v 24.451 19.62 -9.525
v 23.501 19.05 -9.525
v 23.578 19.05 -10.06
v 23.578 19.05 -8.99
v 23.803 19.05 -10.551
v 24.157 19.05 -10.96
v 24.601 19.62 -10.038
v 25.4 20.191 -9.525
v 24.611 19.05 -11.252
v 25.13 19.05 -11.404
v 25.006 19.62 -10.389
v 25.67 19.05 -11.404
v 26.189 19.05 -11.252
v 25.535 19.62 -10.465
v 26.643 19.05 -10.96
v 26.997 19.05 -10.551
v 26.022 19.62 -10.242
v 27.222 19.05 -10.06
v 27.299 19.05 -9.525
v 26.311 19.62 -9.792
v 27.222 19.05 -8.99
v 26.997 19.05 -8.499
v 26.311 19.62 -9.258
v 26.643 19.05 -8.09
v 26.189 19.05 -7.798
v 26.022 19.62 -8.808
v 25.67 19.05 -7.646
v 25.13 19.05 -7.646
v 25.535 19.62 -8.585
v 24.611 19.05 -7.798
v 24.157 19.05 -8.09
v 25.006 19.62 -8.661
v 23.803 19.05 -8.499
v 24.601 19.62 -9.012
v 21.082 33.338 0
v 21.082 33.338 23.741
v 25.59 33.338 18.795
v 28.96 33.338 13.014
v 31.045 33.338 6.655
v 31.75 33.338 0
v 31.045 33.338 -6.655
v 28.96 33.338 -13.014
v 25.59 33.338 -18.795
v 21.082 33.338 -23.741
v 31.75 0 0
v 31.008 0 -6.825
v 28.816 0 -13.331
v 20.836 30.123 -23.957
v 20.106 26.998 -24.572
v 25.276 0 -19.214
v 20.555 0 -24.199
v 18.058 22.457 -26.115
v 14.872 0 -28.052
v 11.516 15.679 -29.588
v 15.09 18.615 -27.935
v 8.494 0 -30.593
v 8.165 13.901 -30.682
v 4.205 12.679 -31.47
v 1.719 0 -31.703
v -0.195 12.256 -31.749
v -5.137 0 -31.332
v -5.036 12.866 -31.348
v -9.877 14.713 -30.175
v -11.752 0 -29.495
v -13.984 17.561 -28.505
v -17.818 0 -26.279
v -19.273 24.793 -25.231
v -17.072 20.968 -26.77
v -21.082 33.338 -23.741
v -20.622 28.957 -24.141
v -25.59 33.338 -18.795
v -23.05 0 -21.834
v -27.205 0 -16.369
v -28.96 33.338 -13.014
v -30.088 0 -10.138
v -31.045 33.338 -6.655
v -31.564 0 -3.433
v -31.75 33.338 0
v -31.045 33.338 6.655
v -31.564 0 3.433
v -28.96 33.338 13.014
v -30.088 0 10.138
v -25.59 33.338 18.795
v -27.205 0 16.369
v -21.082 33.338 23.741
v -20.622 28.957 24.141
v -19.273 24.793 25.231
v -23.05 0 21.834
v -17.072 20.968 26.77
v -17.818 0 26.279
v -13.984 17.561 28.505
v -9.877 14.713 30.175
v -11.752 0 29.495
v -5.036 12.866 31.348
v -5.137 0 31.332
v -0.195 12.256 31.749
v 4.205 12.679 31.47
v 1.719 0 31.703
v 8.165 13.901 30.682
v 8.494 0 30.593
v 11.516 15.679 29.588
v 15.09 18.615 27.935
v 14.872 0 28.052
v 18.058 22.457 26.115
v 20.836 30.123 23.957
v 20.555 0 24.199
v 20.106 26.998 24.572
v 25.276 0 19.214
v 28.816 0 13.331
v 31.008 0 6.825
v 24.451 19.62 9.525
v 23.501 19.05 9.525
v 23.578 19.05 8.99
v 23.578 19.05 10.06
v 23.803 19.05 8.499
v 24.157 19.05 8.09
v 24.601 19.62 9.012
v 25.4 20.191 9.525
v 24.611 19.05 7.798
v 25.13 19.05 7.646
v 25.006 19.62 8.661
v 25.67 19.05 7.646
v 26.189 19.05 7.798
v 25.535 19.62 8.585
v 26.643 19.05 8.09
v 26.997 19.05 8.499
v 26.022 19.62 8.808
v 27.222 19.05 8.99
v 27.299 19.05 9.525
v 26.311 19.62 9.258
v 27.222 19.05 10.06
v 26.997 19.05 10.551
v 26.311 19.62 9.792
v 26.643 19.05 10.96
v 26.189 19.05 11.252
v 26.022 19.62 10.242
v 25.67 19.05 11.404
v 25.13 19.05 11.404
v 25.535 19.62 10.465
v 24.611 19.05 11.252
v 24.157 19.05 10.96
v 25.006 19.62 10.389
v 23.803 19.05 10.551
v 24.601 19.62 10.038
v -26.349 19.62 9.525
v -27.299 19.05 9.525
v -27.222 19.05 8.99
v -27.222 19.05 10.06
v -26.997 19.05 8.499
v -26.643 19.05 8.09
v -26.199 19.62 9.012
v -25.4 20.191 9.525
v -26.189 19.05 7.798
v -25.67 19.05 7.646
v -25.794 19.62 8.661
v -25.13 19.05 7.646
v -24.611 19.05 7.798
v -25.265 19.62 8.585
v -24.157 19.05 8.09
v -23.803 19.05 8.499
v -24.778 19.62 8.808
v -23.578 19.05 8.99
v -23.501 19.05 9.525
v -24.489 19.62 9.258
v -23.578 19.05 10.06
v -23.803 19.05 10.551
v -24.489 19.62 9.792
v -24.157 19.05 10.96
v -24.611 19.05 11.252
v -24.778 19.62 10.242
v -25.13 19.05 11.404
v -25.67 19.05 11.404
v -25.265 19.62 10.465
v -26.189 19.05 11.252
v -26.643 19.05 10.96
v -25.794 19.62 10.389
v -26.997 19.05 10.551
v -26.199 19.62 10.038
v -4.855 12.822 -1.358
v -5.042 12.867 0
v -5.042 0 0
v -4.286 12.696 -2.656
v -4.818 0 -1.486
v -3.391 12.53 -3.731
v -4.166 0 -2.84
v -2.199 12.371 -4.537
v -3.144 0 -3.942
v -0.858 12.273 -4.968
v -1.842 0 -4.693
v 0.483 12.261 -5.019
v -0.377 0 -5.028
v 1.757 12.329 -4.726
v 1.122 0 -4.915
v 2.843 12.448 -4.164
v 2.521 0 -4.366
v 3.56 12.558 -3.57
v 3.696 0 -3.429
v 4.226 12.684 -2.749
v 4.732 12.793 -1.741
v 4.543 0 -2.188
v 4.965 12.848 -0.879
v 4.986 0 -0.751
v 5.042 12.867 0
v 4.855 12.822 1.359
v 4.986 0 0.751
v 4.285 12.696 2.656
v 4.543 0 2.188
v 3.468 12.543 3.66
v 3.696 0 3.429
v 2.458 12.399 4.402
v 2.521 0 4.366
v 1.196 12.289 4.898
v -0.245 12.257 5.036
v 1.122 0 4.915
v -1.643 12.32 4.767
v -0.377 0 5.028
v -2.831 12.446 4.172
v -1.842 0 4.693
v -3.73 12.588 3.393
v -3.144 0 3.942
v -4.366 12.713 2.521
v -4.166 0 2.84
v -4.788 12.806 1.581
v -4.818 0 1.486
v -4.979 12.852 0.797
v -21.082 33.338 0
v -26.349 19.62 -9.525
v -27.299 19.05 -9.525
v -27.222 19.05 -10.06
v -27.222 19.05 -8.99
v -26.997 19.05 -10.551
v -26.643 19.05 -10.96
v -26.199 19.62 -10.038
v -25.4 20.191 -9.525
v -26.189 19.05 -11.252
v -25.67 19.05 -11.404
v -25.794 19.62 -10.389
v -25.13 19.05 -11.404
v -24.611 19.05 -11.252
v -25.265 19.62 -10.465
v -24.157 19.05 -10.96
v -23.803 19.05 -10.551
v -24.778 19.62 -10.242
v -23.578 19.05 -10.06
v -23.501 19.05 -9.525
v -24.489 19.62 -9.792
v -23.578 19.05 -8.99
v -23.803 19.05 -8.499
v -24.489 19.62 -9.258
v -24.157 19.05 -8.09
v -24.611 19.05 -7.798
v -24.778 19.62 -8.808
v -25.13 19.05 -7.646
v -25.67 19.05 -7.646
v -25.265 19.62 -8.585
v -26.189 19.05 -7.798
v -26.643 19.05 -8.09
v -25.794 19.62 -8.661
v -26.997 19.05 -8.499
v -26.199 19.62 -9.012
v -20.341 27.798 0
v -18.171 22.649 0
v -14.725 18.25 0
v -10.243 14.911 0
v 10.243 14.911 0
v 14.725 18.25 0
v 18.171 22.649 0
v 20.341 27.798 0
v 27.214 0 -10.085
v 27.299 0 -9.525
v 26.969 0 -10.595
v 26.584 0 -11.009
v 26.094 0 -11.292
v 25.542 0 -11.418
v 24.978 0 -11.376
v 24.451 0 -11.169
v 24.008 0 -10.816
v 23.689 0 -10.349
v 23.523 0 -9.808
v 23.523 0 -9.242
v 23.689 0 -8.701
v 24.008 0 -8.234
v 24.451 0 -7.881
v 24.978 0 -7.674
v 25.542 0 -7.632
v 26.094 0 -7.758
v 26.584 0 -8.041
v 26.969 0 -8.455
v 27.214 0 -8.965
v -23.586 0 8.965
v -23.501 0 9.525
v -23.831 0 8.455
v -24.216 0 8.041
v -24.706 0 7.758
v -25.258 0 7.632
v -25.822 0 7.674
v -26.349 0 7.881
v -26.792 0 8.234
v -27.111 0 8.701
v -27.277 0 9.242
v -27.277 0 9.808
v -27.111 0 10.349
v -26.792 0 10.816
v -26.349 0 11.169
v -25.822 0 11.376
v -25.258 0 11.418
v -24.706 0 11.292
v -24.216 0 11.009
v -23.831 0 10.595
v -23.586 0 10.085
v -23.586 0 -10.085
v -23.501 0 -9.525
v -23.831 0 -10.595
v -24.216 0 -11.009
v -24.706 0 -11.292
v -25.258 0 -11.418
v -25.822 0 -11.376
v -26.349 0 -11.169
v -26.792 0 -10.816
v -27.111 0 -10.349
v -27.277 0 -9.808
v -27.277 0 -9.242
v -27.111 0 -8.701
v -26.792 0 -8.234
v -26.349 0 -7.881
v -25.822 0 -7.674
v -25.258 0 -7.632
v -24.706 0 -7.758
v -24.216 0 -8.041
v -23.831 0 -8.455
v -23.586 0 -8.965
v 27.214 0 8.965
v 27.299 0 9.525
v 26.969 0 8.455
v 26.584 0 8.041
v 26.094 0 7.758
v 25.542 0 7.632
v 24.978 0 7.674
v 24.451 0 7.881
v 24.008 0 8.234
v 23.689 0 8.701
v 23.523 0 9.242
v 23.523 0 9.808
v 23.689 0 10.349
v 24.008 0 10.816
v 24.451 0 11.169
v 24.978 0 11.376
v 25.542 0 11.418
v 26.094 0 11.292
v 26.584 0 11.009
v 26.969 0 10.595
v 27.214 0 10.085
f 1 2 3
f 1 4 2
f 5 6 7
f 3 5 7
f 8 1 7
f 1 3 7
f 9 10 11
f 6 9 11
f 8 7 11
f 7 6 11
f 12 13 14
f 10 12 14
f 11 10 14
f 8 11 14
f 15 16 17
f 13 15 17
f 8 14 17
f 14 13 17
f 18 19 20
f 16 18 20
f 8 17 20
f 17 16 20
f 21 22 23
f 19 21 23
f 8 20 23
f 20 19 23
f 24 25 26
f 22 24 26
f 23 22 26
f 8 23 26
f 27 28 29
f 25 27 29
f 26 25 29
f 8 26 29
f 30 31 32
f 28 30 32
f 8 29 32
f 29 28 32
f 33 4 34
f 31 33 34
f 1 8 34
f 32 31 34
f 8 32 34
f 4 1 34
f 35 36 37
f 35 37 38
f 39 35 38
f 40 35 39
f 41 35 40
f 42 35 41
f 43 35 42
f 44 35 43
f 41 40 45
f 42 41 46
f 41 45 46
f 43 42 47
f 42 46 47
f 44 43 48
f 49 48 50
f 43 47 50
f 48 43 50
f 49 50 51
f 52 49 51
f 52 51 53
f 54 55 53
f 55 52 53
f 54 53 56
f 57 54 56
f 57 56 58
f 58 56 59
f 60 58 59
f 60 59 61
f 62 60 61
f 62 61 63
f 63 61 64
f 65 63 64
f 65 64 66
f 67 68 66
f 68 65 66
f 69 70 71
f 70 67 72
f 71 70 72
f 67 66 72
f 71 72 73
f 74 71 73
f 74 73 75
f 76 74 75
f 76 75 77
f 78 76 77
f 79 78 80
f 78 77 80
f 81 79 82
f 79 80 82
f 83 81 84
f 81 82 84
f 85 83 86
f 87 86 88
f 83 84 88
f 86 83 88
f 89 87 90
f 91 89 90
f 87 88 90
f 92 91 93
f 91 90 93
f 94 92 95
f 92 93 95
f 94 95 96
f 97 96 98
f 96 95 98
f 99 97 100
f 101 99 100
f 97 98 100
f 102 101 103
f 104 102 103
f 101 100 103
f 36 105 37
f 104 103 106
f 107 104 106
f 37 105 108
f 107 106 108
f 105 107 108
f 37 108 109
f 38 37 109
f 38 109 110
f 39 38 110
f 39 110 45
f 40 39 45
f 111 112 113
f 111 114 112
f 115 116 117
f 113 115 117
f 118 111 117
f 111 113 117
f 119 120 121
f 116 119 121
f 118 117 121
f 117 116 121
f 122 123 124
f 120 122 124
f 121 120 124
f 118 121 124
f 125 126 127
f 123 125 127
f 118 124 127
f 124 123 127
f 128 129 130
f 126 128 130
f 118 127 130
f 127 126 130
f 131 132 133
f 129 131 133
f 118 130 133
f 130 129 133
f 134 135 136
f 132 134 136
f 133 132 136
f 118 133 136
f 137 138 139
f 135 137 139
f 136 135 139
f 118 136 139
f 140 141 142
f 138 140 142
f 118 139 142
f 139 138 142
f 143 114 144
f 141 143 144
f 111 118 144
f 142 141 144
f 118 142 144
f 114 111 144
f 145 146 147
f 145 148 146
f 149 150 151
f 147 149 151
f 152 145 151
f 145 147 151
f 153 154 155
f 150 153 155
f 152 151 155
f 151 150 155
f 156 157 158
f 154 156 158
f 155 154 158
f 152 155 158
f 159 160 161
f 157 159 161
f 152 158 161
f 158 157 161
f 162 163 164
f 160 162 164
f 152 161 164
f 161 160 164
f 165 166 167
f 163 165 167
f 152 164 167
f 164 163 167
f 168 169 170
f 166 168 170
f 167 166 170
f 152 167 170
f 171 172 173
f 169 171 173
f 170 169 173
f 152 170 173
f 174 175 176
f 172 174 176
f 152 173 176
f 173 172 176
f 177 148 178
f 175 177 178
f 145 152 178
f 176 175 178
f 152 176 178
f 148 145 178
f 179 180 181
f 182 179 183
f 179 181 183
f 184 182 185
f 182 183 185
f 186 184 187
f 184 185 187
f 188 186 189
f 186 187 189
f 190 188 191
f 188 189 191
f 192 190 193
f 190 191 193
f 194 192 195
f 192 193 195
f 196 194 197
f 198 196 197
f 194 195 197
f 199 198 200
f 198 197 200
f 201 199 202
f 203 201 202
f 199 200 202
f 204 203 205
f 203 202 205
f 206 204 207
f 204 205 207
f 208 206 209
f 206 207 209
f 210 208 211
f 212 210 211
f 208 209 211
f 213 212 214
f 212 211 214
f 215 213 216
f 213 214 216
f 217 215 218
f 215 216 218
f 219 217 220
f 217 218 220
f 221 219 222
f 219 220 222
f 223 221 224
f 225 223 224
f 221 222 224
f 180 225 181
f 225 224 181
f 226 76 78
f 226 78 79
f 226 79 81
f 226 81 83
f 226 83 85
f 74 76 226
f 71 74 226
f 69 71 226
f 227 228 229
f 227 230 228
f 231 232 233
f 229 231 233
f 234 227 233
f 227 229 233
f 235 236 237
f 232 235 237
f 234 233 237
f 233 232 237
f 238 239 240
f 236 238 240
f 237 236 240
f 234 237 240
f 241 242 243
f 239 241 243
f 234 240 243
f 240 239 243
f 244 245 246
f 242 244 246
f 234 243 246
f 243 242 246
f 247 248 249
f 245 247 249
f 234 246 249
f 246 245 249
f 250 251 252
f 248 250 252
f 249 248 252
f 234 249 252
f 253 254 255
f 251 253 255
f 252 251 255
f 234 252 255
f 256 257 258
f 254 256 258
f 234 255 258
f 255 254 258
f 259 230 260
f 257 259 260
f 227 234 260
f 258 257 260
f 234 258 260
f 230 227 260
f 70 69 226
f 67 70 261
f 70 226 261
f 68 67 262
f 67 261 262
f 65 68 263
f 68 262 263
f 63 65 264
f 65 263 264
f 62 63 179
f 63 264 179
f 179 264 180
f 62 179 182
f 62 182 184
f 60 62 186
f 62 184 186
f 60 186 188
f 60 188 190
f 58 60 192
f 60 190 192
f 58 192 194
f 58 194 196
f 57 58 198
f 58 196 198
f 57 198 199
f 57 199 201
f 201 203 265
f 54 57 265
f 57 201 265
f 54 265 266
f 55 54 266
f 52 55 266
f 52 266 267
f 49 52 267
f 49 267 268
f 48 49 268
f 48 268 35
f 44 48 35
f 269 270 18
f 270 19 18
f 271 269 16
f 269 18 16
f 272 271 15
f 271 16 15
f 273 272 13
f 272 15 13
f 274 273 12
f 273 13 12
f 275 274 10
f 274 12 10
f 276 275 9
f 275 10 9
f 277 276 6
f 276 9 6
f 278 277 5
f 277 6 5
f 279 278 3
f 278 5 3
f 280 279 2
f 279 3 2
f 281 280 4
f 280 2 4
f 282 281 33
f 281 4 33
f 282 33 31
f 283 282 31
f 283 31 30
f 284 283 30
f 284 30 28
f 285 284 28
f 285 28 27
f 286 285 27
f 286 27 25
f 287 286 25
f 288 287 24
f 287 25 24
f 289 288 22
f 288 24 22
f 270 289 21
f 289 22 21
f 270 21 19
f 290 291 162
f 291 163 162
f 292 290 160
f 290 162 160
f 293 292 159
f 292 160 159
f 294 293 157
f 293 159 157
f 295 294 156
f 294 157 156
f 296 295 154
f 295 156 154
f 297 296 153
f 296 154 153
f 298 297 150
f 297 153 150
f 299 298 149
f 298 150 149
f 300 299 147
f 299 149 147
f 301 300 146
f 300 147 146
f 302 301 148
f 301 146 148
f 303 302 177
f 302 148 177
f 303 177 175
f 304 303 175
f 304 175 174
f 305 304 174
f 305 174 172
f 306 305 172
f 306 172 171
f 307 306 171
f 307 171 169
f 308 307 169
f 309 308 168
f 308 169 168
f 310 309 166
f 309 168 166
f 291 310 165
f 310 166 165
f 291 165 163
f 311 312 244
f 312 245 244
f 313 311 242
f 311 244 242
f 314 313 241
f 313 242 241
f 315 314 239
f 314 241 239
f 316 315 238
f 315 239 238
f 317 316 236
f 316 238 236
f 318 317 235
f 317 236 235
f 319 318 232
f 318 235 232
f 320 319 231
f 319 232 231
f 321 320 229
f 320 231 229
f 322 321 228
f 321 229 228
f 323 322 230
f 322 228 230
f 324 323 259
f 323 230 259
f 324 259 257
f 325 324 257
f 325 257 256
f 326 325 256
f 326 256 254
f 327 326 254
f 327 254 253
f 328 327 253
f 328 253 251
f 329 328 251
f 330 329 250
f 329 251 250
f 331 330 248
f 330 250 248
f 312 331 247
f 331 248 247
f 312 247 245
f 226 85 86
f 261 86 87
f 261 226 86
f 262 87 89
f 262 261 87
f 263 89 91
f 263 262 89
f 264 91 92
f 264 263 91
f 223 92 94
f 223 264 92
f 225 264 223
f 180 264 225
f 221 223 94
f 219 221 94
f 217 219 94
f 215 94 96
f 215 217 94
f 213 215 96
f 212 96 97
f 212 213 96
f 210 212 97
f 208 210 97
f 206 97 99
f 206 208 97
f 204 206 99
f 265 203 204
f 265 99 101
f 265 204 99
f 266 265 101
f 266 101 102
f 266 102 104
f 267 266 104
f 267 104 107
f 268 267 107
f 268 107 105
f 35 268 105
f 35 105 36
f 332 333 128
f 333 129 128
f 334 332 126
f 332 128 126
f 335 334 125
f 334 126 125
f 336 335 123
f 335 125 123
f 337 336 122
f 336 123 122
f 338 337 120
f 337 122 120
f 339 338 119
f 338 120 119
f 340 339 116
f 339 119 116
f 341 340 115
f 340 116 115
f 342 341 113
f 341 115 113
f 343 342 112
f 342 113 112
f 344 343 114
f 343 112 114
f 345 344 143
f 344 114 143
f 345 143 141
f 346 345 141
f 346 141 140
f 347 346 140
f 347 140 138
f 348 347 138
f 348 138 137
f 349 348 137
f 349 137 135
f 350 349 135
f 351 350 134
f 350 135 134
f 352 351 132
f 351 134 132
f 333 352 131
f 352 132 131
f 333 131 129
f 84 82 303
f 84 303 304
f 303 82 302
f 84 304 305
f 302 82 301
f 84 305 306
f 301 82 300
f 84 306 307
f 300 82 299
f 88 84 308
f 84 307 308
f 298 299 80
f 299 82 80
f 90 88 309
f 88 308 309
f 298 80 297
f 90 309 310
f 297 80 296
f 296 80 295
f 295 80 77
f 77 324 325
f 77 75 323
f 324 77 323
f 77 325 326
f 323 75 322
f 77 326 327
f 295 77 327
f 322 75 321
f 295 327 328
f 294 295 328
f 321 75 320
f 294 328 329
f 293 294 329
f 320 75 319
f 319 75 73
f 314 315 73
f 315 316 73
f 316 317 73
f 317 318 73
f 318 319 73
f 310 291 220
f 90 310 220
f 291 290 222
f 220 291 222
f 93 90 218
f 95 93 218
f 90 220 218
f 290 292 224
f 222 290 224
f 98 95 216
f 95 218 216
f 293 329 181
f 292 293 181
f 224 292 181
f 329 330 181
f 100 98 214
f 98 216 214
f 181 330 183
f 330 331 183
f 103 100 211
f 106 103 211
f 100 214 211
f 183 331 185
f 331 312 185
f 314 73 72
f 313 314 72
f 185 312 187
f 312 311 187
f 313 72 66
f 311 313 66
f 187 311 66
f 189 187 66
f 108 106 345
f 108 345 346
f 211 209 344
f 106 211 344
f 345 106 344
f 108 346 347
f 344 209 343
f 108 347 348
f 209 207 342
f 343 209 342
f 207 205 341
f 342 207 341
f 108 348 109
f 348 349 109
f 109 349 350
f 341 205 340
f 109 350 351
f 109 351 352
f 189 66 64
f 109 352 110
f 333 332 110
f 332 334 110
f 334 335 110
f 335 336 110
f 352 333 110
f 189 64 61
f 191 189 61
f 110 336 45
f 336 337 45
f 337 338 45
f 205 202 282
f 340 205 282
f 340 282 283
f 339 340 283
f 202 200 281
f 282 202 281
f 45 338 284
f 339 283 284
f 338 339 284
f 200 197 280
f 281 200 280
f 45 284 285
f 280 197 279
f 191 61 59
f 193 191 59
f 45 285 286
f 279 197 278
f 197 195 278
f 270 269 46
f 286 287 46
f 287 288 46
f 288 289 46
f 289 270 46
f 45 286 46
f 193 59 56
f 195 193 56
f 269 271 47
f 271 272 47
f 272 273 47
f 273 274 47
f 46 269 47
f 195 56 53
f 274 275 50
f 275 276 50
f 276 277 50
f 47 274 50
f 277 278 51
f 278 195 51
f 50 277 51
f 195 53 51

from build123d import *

# Parameters (mm, degrees)
SKETCH1_R                      = 31.75
BOSS_EXTRUDE1_DEPTH            = 33.3375
F_3_8_CLEARANCE_HOLE1_D        = 10.0838
CUT_EXTRUDE1_DEPTH             = 50.8
CUT_EXTRUDE1_DEPTH_BACK        = 50.8
SKETCH4_R                      = 21.082
TAP_DRILL_FOR_10_24_TAP1_D     = 3.7973
TAP_DRILL_FOR_10_24_TAP1_DEPTH = 19.05
TAP_DRILL_FOR_10_24_TAP1_TIP   = 1.140824014


with BuildPart() as part:
    # Sketch1 → Boss-Extrude1 (new body)
    with BuildSketch(Plane(origin=(0, 0, 0), x_dir=(1, 0, 0), z_dir=(0, 1, 0))):
        Circle(SKETCH1_R)
    extrude(amount=BOSS_EXTRUDE1_DEPTH)

    # 3/8 Clearance Hole1 (through all)
    with Locations(Plane(origin=(0, 33.3375, 0), x_dir=(1, 0, 0), z_dir=(0, 1, 0))):
        with Locations((0, 0)):
            Hole(F_3_8_CLEARANCE_HOLE1_D / 2)

    # Sketch4 → Cut-Extrude1 (cut, two sides: drawn at the far end of the back side and taken through both)
    with BuildSketch(Plane.XY.offset(-CUT_EXTRUDE1_DEPTH_BACK)):
        with Locations((0, 33.3375)):
            Circle(SKETCH4_R)
    extrude(amount=CUT_EXTRUDE1_DEPTH + CUT_EXTRUDE1_DEPTH_BACK, mode=Mode.SUBTRACT)

    # Tap Drill for #10-24 Tap1
    with Locations(Plane(origin=(0, 0, 0), x_dir=(-1, 0, 0), z_dir=(0, -1, 0))):
        with Locations((25.4, -9.525), (25.4, 9.525), (-25.4, 9.525), (-25.4, -9.525)):
            Hole(TAP_DRILL_FOR_10_24_TAP1_D / 2, depth=TAP_DRILL_FOR_10_24_TAP1_DEPTH)
            with Locations((0, 0, -(TAP_DRILL_FOR_10_24_TAP1_DEPTH + TAP_DRILL_FOR_10_24_TAP1_TIP / 2))):  # 118° drill point
                Cone(0, TAP_DRILL_FOR_10_24_TAP1_D / 2, TAP_DRILL_FOR_10_24_TAP1_TIP, mode=Mode.SUBTRACT)


solid = part.part
